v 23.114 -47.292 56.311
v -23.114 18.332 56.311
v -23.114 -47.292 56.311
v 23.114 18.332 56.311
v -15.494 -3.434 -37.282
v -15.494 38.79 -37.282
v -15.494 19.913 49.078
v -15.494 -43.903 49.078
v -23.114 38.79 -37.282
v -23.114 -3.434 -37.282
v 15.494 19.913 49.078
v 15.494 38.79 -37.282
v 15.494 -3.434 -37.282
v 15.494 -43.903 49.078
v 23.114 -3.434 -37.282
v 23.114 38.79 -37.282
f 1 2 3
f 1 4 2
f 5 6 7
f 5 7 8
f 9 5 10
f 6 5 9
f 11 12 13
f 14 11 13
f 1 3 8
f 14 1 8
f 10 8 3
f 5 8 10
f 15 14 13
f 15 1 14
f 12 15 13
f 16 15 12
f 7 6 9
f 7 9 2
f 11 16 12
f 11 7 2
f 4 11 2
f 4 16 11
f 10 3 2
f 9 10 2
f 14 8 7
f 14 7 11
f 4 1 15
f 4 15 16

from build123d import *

# Parameters (mm, degrees)
F1_DEPTH = 23.114
F2_W     = 30.988
F2_H     = 94.282678
F3_DEPTH = 86.36


with BuildPart() as f1:
    # F0 (on Right) → F1 (new body, symmetric)
    with BuildSketch(Plane.YZ):
        Polygon((18.332004, 56.31125), (-47.292158, 56.31125), (-3.433616, -37.281614), (38.789531, -37.281614), align=None)
    extrude(amount=F1_DEPTH, both=True)

    # F2 (on face) → F3 (cut)
    with BuildSketch(Plane(origin=(0, 0, -37.281614), x_dir=(1, 0, 0), z_dir=(0, 0, -1))):
        with Locations((0, 3.863558)):
            Rectangle(F2_W, F2_H)
    extrude(amount=-F3_DEPTH, mode=Mode.SUBTRACT)


solid = f1.part
